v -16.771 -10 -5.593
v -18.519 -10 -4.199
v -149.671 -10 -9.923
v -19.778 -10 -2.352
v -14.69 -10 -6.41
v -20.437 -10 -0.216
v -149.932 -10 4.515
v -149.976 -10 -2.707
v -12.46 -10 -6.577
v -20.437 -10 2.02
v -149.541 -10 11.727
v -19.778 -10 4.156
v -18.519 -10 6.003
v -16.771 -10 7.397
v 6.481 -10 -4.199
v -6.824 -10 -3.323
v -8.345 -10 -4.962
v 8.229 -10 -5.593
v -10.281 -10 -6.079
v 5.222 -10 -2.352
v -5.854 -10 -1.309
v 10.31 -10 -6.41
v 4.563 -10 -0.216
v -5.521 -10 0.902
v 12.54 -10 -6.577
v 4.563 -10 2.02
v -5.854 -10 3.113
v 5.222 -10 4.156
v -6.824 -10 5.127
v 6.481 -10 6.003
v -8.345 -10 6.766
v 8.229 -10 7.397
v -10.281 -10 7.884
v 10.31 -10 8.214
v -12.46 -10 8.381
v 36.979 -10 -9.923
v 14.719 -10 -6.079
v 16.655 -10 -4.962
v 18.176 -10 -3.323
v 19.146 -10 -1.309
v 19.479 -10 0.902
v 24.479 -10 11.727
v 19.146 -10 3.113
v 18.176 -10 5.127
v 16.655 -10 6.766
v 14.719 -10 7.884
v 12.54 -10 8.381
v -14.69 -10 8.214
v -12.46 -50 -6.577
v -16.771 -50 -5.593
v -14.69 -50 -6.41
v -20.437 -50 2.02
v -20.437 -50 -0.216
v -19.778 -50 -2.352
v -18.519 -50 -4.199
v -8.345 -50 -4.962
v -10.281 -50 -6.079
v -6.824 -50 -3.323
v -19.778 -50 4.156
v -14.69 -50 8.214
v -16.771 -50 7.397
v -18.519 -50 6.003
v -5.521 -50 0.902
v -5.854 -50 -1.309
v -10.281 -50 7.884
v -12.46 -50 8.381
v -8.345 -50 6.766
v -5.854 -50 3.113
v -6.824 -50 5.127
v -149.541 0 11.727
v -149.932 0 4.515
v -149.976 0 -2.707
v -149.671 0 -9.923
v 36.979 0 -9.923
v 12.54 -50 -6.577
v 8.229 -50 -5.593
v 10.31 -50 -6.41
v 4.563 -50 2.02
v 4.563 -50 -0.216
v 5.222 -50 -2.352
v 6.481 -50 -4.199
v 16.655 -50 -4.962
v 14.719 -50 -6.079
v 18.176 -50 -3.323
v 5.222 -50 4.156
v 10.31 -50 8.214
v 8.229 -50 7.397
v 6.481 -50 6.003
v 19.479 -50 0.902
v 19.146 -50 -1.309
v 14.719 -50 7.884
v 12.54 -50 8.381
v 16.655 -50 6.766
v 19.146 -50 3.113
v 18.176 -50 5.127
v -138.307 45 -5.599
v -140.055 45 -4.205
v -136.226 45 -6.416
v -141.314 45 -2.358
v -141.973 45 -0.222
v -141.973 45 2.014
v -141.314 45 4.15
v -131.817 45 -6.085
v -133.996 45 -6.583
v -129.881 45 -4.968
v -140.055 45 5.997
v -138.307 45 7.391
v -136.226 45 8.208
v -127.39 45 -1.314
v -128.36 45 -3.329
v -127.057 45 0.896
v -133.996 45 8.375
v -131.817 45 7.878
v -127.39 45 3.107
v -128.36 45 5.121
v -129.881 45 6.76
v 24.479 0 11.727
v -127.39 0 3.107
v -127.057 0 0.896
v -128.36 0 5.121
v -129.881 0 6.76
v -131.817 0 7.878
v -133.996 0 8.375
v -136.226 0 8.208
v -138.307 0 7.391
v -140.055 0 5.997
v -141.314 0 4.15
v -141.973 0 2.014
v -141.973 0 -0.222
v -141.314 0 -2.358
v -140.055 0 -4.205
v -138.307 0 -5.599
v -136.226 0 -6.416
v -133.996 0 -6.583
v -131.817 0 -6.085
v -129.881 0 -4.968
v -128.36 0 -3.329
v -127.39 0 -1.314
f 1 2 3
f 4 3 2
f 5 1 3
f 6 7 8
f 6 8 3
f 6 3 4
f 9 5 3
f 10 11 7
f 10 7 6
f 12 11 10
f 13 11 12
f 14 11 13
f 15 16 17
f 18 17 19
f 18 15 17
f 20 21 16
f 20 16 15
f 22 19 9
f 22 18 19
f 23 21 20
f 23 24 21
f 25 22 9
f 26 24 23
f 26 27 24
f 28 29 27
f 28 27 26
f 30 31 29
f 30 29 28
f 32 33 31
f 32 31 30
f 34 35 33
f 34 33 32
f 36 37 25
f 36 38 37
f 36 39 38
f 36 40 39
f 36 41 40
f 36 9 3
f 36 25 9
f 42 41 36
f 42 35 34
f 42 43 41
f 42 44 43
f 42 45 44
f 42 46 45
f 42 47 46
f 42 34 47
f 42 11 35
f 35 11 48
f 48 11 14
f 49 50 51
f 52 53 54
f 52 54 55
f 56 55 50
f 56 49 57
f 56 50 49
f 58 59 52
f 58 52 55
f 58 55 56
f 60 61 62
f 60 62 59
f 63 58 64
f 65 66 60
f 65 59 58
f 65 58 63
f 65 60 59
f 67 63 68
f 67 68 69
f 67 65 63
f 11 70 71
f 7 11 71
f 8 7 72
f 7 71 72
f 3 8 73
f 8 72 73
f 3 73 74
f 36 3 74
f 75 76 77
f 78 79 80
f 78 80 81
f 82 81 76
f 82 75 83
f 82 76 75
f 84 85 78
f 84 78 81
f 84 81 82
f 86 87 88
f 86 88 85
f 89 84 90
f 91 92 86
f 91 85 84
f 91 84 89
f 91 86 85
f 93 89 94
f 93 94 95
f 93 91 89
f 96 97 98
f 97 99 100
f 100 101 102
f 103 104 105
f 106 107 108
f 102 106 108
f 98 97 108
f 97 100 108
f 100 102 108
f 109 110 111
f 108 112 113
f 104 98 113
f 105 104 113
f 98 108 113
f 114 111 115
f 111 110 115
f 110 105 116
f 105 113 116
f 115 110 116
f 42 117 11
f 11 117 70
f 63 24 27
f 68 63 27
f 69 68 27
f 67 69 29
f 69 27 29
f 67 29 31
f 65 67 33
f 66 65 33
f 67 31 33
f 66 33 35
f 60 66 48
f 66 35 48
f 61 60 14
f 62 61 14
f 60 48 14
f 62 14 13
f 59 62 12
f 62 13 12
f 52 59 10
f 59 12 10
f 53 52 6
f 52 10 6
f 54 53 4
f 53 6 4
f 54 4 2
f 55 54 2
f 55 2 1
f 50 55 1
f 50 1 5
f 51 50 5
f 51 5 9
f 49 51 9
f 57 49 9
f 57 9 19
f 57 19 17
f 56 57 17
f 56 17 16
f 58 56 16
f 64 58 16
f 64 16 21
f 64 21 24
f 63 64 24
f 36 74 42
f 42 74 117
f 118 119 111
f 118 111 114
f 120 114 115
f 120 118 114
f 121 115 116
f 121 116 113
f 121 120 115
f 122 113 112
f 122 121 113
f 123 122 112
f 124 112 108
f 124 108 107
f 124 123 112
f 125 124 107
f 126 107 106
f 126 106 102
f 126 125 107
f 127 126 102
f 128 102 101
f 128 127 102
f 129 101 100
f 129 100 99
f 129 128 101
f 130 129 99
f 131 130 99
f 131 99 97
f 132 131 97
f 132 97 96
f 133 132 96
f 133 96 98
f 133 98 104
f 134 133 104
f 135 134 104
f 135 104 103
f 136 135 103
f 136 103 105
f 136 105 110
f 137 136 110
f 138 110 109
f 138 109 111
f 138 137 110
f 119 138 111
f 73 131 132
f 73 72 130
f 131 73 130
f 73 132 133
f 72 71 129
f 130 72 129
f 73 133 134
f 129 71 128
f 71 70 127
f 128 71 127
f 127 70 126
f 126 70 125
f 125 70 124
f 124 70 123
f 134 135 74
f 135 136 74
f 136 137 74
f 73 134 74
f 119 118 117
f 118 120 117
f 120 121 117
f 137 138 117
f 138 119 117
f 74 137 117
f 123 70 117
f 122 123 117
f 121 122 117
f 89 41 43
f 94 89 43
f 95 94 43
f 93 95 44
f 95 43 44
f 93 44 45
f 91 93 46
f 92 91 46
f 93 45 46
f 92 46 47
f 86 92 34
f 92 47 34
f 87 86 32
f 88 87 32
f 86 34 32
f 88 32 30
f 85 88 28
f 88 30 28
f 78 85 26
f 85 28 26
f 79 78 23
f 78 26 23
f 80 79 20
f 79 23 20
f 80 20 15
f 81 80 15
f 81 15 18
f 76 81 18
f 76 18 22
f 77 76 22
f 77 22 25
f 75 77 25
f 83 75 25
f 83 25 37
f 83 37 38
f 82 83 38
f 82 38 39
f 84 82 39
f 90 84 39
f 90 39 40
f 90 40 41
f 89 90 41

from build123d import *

# Parameters (mm, degrees)
F0_R     = 7.5
F1_DEPTH = 10
F2_DEPTH = 50
F3_DEPTH = 45


with BuildPart() as f1:
    # F0 (on Front) → F1 (new body)
    with BuildSketch(Plane.XZ):
        Polygon((-25.520833, 11.727427), (-38.020833, -9.923208), (-13.020833, -9.923208), (0, -9.923208), (11.979167, -9.923208), (36.979167, -9.923208), (24.479167, 11.727427), (11.979167, 11.727427), align=None)
        with Locations((-13.020833, 0.90211)):
            Circle(F0_R, mode=Mode.SUBTRACT)
        with Locations((11.979167, 0.90211)):
            Circle(F0_R, mode=Mode.SUBTRACT)
        with BuildLine():
            Line((-119.589004, -9.923208), (-38.020833, -9.923208))
            Line((-38.020833, -9.923208), (-25.520833, 11.727427))
            Line((-25.520833, 11.727427), (-119.425573, 11.727427))
            ThreePointArc((-119.425573, 11.727427), (-119.996581, 0.905803), (-119.589004, -9.923208))
        make_face()
        with BuildLine():
            Line((-149.671407, -9.923208), (-119.589004, -9.923208))
            ThreePointArc((-119.589004, -9.923208), (-119.996581, 0.905803), (-119.425573, 11.727427))
            Line((-119.425573, 11.727427), (-149.540855, 11.727427))
            ThreePointArc((-149.540855, 11.727427), (-149.997273, 0.904468), (-149.671407, -9.923208))
        make_face()
        with Locations((-134.55675, 0.896197)):
            Circle(F0_R, mode=Mode.SUBTRACT)
        with Locations((-134.55675, 0.896197)):
            Circle(F0_R)
    extrude(amount=F1_DEPTH)

    # F0 (on Front) → F2 (join)
    with BuildSketch(Plane.XZ):
        with Locations((-13.020833, 0.90211)):
            Circle(F0_R)
        with Locations((11.979167, 0.90211)):
            Circle(F0_R)
    extrude(amount=F2_DEPTH)

    # F0 (on Front) → F3 (join)
    with BuildSketch(Plane.XZ):
        with Locations((-134.55675, 0.896197)):
            Circle(F0_R)
    extrude(amount=-F3_DEPTH)


solid = f1.part
